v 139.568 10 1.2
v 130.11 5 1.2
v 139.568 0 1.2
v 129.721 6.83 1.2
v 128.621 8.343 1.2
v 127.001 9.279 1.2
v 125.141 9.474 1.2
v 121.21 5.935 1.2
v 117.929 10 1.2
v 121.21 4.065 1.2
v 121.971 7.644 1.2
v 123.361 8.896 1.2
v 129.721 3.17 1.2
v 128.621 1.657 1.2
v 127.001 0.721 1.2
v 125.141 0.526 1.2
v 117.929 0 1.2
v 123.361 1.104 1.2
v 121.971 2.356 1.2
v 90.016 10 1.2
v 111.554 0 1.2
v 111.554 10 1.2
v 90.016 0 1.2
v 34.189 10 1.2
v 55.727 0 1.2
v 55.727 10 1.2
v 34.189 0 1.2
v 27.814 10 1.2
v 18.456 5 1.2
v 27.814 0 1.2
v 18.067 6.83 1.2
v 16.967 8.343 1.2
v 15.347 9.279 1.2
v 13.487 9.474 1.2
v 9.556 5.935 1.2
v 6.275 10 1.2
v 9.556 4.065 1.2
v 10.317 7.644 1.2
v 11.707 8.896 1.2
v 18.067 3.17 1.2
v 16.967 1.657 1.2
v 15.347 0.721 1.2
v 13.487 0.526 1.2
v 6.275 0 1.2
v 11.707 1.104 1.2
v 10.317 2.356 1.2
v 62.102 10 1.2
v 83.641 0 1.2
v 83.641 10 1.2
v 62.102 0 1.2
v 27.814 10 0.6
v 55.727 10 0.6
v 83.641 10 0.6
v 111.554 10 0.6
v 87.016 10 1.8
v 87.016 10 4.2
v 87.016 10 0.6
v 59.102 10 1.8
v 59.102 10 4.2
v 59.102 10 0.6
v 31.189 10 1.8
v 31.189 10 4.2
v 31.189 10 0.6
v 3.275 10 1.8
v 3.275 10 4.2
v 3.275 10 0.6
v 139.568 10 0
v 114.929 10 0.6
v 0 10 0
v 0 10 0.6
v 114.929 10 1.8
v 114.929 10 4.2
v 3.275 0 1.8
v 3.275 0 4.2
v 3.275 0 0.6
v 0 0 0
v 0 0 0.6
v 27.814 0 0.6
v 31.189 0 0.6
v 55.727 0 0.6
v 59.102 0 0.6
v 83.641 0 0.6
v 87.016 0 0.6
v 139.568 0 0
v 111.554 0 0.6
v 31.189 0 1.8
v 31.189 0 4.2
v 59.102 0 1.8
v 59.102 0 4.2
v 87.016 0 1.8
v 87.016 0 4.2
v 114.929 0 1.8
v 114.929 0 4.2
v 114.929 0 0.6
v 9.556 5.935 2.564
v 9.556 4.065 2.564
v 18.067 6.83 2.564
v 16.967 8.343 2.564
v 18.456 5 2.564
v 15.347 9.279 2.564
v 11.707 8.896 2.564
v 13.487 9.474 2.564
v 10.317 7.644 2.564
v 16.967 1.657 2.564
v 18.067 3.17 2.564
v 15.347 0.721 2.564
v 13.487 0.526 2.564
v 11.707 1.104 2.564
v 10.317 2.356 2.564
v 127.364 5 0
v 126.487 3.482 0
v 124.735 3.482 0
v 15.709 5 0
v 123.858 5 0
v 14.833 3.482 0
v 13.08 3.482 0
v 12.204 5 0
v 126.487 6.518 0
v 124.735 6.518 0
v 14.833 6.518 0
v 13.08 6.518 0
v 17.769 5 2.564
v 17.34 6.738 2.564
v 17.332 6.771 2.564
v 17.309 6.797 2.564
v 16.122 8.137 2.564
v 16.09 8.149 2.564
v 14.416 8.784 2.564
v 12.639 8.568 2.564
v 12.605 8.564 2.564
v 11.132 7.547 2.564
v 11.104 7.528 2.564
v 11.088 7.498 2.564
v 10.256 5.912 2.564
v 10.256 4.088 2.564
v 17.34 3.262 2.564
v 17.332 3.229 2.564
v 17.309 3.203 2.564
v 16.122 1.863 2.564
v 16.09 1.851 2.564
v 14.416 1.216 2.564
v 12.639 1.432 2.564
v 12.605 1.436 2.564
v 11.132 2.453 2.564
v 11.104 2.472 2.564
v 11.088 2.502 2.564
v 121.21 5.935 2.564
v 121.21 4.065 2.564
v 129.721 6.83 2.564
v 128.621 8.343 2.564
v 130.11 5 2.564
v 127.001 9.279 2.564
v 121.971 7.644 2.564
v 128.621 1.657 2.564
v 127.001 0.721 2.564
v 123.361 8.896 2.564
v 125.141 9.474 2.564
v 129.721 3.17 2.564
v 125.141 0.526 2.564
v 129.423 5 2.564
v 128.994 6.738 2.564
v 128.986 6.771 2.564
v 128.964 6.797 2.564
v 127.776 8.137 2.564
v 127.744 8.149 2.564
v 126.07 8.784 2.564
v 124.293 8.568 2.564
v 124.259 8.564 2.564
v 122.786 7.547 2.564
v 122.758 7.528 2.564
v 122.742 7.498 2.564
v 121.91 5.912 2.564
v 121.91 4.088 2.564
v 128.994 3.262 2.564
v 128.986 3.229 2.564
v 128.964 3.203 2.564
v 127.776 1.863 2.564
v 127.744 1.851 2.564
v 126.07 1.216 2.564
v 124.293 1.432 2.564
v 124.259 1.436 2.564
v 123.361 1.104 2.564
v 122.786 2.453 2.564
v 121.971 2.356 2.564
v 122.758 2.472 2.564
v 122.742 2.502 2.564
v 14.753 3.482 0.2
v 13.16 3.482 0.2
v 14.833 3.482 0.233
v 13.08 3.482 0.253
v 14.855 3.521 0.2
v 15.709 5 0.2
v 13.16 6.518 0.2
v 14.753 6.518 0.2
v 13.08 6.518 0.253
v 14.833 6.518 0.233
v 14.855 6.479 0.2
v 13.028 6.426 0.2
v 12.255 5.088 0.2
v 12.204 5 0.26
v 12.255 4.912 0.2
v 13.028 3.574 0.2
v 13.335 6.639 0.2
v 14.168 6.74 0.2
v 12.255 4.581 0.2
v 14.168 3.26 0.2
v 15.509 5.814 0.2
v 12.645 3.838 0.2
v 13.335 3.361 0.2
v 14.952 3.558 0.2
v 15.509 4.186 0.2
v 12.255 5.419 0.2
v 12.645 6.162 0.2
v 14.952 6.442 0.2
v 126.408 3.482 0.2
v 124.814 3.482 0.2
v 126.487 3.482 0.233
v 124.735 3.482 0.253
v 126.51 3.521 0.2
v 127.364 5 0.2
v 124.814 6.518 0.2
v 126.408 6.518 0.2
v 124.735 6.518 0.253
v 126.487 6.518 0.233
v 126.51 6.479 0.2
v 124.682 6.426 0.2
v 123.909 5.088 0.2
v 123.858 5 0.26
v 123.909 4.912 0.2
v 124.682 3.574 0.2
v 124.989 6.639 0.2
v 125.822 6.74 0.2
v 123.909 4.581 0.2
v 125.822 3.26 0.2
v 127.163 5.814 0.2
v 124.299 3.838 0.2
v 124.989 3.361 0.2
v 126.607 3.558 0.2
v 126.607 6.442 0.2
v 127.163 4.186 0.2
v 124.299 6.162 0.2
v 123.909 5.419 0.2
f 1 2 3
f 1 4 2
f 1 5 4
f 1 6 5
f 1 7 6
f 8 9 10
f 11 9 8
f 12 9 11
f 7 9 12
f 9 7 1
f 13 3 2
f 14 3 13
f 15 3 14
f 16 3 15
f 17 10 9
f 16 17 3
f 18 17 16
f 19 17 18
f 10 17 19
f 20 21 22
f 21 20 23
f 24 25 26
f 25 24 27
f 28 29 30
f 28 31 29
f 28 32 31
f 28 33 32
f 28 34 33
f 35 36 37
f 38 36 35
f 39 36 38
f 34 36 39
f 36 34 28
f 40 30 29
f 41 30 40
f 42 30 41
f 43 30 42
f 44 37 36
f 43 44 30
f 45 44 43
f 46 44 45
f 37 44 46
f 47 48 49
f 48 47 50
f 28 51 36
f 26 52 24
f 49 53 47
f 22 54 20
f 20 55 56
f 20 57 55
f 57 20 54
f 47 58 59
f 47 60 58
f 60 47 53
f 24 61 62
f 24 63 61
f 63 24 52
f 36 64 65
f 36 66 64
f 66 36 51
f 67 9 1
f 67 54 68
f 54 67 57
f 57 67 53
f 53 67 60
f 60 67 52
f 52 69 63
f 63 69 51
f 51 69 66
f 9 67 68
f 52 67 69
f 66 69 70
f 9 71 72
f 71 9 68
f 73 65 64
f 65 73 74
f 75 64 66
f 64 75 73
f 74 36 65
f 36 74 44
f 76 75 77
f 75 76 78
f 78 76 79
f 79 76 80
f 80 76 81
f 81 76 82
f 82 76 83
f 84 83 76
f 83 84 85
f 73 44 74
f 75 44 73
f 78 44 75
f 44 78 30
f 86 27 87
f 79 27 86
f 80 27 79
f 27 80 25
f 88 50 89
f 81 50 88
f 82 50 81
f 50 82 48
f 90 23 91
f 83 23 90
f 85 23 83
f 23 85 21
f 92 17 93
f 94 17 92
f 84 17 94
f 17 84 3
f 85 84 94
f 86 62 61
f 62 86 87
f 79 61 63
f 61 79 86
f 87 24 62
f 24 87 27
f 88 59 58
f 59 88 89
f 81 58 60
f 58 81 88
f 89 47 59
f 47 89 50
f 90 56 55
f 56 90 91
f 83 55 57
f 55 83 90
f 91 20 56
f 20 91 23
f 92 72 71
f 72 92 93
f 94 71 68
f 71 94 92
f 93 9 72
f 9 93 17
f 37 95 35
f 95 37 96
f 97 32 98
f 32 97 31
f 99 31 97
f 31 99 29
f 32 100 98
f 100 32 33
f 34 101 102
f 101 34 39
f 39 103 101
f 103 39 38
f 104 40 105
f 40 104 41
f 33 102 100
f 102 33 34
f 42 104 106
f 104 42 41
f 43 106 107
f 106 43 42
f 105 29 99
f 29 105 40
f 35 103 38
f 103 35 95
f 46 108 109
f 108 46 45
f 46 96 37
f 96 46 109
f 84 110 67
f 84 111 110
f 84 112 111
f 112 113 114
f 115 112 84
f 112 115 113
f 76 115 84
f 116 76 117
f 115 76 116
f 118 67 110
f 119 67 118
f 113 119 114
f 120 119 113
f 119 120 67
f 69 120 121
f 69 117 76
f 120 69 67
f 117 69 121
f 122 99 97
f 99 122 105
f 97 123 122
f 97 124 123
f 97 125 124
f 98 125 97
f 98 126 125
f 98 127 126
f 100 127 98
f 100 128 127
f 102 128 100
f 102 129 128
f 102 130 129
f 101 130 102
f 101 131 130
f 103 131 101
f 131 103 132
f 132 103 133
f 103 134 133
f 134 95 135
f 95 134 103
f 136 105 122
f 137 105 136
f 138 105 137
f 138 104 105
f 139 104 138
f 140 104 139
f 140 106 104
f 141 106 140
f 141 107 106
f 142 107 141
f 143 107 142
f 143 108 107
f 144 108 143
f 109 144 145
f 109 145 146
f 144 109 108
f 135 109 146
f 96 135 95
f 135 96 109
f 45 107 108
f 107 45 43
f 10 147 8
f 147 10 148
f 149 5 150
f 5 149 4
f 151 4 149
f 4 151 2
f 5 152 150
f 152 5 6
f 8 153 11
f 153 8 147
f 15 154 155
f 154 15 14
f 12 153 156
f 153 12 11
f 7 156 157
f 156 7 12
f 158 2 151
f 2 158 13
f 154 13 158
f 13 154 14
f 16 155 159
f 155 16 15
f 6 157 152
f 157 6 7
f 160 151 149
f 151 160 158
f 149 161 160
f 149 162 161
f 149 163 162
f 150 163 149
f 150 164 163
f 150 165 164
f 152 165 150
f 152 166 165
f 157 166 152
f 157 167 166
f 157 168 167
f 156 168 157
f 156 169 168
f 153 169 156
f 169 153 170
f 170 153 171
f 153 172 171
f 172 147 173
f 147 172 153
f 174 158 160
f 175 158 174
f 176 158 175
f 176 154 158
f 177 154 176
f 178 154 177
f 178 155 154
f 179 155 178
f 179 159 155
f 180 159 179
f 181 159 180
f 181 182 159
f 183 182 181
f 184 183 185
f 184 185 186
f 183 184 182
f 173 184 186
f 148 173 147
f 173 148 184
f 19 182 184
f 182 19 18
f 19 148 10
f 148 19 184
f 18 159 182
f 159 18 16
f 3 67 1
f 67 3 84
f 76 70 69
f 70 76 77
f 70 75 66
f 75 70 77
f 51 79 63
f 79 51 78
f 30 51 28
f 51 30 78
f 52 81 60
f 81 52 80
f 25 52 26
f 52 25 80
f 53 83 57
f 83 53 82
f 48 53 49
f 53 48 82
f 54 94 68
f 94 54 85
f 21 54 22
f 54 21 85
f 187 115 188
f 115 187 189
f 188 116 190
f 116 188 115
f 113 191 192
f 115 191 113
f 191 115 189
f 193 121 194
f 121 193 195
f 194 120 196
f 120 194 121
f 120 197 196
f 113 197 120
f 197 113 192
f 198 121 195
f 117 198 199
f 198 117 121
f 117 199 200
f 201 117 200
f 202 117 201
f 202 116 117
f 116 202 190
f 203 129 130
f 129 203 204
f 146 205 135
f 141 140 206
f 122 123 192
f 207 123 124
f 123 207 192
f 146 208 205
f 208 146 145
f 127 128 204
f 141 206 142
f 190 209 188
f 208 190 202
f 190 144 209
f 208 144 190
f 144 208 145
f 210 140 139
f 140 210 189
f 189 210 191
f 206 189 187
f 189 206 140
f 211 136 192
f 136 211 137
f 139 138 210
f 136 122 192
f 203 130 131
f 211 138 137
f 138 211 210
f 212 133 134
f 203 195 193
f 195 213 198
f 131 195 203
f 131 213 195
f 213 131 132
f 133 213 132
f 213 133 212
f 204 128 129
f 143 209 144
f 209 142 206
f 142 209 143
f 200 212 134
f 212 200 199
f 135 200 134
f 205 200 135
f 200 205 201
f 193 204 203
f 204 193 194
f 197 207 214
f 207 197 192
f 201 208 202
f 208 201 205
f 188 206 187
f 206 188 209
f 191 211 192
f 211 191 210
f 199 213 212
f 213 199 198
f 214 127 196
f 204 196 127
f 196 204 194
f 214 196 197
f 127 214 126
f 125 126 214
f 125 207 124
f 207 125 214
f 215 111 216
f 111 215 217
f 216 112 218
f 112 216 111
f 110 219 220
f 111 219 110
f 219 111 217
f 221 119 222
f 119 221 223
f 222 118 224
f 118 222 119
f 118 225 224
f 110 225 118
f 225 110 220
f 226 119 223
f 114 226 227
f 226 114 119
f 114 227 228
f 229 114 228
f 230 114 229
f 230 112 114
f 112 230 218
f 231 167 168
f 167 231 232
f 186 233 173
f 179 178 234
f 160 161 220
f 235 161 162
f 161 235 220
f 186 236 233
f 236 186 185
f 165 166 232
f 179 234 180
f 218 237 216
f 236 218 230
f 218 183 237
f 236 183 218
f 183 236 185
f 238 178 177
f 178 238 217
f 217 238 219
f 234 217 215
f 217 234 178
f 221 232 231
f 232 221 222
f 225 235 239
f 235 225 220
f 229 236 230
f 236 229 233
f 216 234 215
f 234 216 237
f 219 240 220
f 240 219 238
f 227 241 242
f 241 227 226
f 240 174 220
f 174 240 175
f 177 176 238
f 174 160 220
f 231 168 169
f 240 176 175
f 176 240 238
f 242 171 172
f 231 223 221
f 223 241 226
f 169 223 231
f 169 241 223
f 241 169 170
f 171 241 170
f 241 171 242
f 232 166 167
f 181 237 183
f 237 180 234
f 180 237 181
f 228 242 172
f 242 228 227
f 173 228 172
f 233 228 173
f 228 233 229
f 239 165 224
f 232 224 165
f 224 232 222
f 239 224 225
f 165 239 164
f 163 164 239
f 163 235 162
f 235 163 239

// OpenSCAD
/*

    This program is free software: you can redistribute it and/or modify it under the terms of the Affero GNU General Public License as published by the Free Software Foundation, either version 3 of the License, or (at your option) any later version.

    This program is distributed in the hope that it will be useful, but WITHOUT ANY WARRANTY; without even the implied warranty of MERCHANTABILITY or FITNESS FOR A PARTICULAR PURPOSE.  See the Affero GNU General Public License for more details.

    You should have received a copy of the GNU General Public License along with this program.  If not, see <https://www.gnu.org/licenses/agpl-3.0.txt>
*/


/**********************
globals
**********************/
e = 0.1;

//kallax dimensions
kallax_h = (13 + 3/16)*25.4;

/**********************
renders
**********************/
//bottom holder
//kallax_hardboard_holders(kallax_h/2, 6);

//top holder
kallax_hardboard_holders(kallax_h/2*5/6, 5);

/**********************
modules
**********************/
module kallax_hardboard_holders(h, num) {
  // vars
  hb_w = 1/8*25.4 + e*2;
  w = 10;
  
  
  hole_d = .138*25.4;
  cs_D = .307*25.4;
  cs_H = .097*25.4;
  
  t = 0.4*3;
  
  screw_hole_loop = [h/num*.5, h-h/num*.5];
  support_size = 3;
  
  difference () {
    union () {
      // main strip
      cube([h, w, t]);
      
      // supports
      for (i=[0:num-1]) {
        translate([hb_w+support_size-e+(h/num)*i,0,t])
        rotate([0,0,90])
        prism(w,support_size, support_size);
      }
      
      // supports for screws
      for (i=screw_hole_loop) {
        translate([i, w/2, 0]) cylinder(h=e+cs_H, d=cs_D+t);
      }
    }
    
    // cutouts for shelves
    for (i=[0:num-1]) {
        translate ([i*h/num-e, -e/2, t/2])
        cube([hb_w, w+e, t]);
    }
    
    // holes for screws
    for (i=screw_hole_loop) {
      translate([i,w/2,0]){
        translate([0,0,-cs_H*1.5]) cylinder(h=3*cs_H, d=hole_d); // screw hole
        translate([0,0,2*e]) cylinder(h=cs_H, d1=hole_d, d2=cs_D); // counter sink
      }
    }
  }
  
}

module prism(l, w, h){
       polyhedron(
               points=[[0,0,0], [l,0,0], [l,w,0], [0,w,0], [0,w,h], [l,w,h]],
               faces=[[0,1,2,3],[5,4,3,2],[0,4,5,1],[0,3,4],[5,2,1]]
               );
 }
